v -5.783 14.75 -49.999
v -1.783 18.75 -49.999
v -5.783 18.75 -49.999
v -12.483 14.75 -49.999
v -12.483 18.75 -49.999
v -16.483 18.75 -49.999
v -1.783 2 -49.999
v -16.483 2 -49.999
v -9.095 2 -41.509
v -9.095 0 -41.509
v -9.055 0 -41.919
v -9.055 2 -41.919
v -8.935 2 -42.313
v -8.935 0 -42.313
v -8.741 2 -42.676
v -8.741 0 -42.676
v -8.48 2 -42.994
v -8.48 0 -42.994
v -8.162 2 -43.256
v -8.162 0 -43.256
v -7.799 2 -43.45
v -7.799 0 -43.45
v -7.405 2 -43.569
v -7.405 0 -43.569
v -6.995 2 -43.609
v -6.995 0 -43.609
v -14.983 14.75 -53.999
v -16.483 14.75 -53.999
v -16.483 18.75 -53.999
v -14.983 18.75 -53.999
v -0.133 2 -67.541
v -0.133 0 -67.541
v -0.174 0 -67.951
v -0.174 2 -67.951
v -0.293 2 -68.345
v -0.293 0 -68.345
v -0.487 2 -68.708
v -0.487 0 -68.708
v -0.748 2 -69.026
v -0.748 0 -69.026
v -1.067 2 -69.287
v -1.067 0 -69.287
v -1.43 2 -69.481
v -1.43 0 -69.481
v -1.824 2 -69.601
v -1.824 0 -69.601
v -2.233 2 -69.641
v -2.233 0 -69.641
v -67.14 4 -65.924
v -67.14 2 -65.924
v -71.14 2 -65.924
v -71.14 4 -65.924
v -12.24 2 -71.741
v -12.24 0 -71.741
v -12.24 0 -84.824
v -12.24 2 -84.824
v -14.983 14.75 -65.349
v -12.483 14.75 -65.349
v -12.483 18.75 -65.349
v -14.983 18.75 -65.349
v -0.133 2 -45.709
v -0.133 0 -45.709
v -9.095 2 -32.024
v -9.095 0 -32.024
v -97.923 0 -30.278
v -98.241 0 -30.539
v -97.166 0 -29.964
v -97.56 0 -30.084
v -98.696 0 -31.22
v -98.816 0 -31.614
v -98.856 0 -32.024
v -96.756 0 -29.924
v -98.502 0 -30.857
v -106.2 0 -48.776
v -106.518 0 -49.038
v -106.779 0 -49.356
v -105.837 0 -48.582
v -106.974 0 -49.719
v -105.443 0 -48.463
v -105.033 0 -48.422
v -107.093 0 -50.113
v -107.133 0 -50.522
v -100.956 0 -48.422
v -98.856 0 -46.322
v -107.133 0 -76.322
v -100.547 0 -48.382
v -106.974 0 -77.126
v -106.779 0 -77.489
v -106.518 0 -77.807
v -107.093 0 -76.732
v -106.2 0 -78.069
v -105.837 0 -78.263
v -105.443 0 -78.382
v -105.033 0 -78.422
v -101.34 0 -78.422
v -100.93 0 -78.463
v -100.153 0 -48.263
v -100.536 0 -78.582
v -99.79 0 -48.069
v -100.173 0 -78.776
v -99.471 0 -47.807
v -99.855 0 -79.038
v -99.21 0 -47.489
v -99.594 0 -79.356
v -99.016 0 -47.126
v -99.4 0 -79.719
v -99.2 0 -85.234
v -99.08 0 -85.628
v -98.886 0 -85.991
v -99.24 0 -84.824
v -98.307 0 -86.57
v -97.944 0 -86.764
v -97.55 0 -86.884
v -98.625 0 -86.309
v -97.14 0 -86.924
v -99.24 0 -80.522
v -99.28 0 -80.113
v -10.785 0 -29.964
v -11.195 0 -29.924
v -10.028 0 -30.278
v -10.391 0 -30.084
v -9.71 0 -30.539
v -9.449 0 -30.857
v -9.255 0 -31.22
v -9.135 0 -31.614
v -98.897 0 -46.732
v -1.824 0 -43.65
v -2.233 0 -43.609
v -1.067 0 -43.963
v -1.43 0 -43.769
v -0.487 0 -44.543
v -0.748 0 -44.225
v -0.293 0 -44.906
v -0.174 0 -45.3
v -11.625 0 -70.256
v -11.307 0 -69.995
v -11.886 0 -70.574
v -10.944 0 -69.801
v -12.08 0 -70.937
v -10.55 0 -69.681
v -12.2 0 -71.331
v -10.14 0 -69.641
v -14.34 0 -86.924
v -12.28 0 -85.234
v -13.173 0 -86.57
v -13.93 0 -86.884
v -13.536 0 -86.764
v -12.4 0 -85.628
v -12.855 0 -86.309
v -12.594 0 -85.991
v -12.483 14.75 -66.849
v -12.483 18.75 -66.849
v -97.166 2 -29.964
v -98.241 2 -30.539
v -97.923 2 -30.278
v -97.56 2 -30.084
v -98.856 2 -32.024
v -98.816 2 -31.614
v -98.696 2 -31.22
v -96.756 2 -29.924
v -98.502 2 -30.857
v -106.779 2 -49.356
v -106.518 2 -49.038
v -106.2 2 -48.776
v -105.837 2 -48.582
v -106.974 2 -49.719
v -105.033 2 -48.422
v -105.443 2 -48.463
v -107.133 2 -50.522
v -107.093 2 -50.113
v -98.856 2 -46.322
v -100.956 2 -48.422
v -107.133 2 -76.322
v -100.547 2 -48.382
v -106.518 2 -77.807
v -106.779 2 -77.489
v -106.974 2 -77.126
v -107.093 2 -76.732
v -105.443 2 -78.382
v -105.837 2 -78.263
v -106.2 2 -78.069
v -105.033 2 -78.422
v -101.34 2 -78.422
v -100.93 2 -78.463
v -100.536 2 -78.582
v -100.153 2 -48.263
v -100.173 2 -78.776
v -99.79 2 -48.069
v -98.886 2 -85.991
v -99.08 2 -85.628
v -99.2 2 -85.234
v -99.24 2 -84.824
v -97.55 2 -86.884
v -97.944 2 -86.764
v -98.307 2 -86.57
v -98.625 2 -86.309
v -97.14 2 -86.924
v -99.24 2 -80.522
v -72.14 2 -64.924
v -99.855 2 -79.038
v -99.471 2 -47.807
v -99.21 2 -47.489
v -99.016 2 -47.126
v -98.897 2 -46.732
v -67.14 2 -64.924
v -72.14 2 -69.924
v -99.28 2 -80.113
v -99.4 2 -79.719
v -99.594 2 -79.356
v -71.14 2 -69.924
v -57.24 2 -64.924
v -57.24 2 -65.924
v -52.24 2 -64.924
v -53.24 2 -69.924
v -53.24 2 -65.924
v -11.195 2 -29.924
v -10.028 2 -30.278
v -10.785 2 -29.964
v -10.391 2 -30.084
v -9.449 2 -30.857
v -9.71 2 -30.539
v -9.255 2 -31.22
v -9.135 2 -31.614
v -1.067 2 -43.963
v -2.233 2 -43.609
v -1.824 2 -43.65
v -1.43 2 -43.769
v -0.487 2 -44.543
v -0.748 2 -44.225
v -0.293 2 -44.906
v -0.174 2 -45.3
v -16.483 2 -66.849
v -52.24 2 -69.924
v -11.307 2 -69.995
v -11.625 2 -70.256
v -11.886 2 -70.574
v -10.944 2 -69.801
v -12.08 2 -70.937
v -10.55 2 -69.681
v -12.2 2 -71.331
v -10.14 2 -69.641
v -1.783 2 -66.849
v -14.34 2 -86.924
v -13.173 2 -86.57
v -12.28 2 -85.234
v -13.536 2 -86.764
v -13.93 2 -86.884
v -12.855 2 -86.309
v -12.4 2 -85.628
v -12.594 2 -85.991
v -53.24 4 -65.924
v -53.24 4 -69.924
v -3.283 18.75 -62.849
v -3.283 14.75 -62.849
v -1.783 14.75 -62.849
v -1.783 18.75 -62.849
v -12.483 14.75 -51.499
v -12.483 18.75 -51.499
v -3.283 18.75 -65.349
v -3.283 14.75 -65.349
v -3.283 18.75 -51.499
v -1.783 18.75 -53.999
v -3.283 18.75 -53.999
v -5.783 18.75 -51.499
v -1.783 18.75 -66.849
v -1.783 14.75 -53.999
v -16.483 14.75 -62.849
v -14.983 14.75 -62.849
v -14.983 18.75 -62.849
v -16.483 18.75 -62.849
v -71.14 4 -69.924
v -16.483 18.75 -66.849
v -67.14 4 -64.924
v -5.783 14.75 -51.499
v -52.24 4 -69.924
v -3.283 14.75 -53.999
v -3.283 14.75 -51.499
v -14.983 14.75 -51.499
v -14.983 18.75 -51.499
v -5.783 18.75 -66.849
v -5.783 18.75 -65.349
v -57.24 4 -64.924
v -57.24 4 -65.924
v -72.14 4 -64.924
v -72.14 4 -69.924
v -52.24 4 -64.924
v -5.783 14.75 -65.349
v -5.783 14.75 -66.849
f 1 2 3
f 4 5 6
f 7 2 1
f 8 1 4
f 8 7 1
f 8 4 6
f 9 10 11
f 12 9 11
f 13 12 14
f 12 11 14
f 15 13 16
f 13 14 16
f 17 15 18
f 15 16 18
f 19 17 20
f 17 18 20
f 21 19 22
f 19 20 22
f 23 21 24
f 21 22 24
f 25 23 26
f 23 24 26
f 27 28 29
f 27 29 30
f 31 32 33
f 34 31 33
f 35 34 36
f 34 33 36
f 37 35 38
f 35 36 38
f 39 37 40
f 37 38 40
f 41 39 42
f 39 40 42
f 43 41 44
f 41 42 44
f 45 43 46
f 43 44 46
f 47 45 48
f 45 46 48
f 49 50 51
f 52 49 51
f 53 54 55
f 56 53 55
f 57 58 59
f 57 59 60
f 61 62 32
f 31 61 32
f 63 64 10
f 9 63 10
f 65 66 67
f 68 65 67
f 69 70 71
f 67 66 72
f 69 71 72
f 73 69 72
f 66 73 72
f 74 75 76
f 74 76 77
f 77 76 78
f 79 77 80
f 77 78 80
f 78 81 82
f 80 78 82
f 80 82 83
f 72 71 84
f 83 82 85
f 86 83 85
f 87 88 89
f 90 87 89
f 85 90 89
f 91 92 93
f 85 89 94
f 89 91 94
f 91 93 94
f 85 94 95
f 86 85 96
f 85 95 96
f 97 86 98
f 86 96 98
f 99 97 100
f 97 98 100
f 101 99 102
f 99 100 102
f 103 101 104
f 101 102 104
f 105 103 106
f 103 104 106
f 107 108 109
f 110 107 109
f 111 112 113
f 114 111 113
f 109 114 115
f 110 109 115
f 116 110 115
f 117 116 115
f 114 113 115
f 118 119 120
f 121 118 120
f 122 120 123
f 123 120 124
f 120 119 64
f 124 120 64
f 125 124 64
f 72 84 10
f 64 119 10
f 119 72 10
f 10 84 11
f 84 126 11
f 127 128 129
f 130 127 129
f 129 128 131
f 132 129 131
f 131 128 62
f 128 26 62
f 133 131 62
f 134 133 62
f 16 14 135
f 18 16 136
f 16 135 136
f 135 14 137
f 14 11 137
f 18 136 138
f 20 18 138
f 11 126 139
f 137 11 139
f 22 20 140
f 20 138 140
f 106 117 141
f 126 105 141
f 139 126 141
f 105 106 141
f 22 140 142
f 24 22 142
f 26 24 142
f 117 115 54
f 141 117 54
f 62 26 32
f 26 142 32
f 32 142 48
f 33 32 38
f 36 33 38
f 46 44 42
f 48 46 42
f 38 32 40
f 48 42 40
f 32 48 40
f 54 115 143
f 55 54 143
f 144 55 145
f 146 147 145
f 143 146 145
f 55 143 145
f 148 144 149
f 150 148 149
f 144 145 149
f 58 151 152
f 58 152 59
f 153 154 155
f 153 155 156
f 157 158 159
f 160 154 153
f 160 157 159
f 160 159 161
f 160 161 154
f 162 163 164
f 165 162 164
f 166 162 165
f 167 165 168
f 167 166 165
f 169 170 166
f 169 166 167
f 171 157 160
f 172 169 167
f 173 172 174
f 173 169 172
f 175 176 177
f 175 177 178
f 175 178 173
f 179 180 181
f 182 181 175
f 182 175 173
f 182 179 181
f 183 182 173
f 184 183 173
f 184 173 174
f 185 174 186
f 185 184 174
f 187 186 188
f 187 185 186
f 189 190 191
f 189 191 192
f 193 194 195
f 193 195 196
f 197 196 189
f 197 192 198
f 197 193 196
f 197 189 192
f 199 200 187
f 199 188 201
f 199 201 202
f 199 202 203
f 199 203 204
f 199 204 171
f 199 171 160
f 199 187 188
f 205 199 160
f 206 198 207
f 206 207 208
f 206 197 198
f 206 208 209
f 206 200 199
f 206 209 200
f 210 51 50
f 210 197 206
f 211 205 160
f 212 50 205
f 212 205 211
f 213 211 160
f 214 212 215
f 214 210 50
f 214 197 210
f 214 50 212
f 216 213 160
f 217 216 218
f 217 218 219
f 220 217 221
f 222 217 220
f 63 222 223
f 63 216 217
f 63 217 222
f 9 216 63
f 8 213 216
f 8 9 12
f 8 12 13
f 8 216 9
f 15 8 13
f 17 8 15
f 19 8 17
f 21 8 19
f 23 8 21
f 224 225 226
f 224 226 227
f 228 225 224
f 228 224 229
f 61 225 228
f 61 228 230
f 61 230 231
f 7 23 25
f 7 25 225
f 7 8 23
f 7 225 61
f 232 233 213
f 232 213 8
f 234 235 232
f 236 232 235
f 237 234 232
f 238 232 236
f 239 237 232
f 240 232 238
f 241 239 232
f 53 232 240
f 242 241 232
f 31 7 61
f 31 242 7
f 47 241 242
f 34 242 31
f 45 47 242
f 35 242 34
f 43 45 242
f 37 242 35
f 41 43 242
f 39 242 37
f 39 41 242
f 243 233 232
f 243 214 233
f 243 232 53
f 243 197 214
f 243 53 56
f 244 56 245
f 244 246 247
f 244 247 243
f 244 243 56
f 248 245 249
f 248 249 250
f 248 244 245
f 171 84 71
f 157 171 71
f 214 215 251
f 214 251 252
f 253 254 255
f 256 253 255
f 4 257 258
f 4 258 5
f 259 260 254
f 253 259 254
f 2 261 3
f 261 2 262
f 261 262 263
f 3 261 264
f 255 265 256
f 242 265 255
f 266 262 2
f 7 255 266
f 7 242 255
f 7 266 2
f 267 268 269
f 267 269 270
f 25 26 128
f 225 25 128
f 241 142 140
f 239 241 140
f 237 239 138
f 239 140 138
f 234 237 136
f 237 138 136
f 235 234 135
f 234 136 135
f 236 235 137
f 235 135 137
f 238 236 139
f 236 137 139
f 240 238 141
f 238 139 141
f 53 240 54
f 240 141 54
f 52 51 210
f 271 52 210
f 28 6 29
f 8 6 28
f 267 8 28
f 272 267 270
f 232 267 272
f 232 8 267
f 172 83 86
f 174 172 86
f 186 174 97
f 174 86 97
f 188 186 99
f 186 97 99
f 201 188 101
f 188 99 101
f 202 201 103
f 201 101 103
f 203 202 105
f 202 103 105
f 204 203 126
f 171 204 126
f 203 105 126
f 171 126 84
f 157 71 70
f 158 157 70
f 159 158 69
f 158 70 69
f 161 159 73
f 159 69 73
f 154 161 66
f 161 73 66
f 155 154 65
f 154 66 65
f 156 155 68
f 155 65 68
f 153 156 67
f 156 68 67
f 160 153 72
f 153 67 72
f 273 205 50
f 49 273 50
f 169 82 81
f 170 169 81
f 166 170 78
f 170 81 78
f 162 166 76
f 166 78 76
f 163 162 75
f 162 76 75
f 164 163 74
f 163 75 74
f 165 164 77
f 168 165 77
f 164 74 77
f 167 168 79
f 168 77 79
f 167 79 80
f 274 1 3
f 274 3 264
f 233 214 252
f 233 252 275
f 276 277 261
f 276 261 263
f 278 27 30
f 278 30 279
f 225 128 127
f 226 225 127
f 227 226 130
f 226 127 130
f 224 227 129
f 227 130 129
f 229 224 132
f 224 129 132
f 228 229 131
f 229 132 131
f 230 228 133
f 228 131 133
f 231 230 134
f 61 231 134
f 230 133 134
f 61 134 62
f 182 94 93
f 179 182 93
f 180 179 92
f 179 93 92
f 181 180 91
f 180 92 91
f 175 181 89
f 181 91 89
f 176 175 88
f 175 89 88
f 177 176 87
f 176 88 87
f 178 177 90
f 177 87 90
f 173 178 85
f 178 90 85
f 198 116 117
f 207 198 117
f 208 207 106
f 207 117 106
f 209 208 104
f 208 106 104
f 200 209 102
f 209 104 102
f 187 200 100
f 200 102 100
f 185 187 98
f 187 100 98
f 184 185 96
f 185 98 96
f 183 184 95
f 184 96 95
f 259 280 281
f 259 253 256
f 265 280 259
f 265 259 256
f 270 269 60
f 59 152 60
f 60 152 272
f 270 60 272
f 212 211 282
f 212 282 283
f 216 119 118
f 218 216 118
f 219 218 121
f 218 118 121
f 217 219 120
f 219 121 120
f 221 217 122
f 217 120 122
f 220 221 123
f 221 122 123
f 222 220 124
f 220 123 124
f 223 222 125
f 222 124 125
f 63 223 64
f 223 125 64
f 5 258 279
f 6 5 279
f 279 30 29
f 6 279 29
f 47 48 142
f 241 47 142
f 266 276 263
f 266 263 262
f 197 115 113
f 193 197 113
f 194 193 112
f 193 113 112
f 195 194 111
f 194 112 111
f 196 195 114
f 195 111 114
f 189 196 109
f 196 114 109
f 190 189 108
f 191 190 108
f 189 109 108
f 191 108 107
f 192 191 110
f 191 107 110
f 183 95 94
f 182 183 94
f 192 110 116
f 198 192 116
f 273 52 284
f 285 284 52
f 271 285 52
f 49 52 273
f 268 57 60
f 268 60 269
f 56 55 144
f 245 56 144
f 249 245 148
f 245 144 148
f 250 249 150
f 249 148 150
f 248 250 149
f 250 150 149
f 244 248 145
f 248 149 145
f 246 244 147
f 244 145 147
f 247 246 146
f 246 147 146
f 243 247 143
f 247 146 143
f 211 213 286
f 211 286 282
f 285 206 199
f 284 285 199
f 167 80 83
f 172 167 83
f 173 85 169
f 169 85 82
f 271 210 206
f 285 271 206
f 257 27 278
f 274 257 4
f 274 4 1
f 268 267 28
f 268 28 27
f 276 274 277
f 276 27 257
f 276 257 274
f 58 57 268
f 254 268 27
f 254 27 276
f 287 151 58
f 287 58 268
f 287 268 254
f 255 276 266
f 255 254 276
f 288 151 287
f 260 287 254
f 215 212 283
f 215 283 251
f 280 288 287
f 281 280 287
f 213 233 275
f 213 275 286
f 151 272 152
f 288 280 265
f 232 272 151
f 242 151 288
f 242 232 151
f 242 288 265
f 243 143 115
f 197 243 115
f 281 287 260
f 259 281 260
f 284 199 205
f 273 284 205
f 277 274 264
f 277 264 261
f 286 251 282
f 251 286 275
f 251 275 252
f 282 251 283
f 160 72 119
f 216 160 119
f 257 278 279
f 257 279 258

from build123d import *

# Parameters (mm, degrees)
BOSS_EXTRUDE1_DEPTH = 2
BOSS_EXTRUDE2_DEPTH = 2
SKETCH3_W           = 14.7
SKETCH3_H           = 16.85
BOSS_EXTRUDE3_DEPTH = 12.75
BOSS_EXTRUDE4_DEPTH = 4


with BuildPart() as part:
    # Sketch1 → Boss-Extrude1 (new body)
    with BuildSketch(Plane(origin=(0, 0, 0), x_dir=(1, 0, 0), z_dir=(0, 1, 0))):
        with BuildLine():
            Line((-14.340002267, 86.923975611), (-97.140002267, 86.923975611))
            ThreePointArc((-97.140002267, 86.923975611), (-98.624926507, 86.308899852), (-99.240002267, 84.823975611))
            Line((-99.240002267, 84.823975611), (-99.240002267, 80.522464507))
            ThreePointArc((-99.240002267, 80.522464507), (-99.855078026, 79.037540266), (-101.340002267, 78.422464507))
            Line((-101.340002267, 78.422464507), (-105.03337779, 78.422464507))
            ThreePointArc((-105.03337779, 78.422464507), (-106.51830203, 77.807388747), (-107.13337779, 76.322464507))
            Line((-107.13337779, 76.322464507), (-107.13337779, 50.522464507))
            ThreePointArc((-107.13337779, 50.522464507), (-106.51830203, 49.037540266), (-105.03337779, 48.422464507))
            Line((-105.03337779, 48.422464507), (-100.956274126, 48.422464507))
            ThreePointArc((-100.956274126, 48.422464507), (-99.471349885, 47.807388747), (-98.856274126, 46.322464507))
            Line((-98.856274126, 46.322464507), (-98.856274126, 32.023975611))
            ThreePointArc((-98.856274126, 32.023975611), (-98.241198366, 30.539051371), (-96.756274126, 29.923975611))
            Line((-96.756274126, 29.923975611), (-11.195092997, 29.923975611))
            ThreePointArc((-11.195092997, 29.923975611), (-9.710168757, 30.539051371), (-9.095092997, 32.023975611))
            Line((-9.095092997, 32.023975611), (-9.095092997, 41.509498791))
            ThreePointArc((-9.095092997, 41.509498791), (-8.480017238, 42.994423032), (-6.995092997, 43.609498791))
            Line((-6.995092997, 43.609498791), (-2.23337779, 43.609498791))
            ThreePointArc((-2.23337779, 43.609498791), (-0.748453549, 44.224574551), (-0.13337779, 45.709498791))
            Line((-0.13337779, 45.709498791), (-0.13337779, 67.540883484))
            ThreePointArc((-0.13337779, 67.540883484), (-0.748453549, 69.025807724), (-2.23337779, 69.640883484))
            Line((-2.23337779, 69.640883484), (-10.140002267, 69.640883484))
            ThreePointArc((-10.140002267, 69.640883484), (-11.624926507, 70.255959243), (-12.240002267, 71.740883484))
            Line((-12.240002267, 71.740883484), (-12.240002267, 84.823975611))
            ThreePointArc((-12.240002267, 84.823975611), (-12.855078026, 86.308899852), (-14.340002267, 86.923975611))
        make_face()
    extrude(amount=BOSS_EXTRUDE1_DEPTH)

    # Sketch2 → Boss-Extrude2 (add)
    with BuildSketch(Plane(origin=(0, 2, 0), x_dir=(1, 0, 0), z_dir=(0, 1, 0))):
        Polygon((-52.240002267, 64.923975611), (-57.240002267, 64.923975611), (-57.240002267, 65.923975611), (-53.240002267, 65.923975611), (-53.240002267, 69.923975611), (-52.240002267, 69.923975611), align=None)
        Polygon((-72.140002267, 64.923975611), (-67.140002267, 64.923975611), (-67.140002267, 65.923975611), (-71.140002267, 65.923975611), (-71.140002267, 69.923975611), (-72.140002267, 69.923975611), align=None)
    extrude(amount=BOSS_EXTRUDE2_DEPTH)

    # Sketch3 → Boss-Extrude3 (add)
    with BuildSketch(Plane(origin=(0, 2, 0), x_dir=(1, 0, 0), z_dir=(0, 1, 0))):
        with Locations((-9.13337779, 58.423975611)):
            Rectangle(SKETCH3_W, SKETCH3_H)
    extrude(amount=BOSS_EXTRUDE3_DEPTH)

    # Sketch4 → Boss-Extrude4 (add)
    with BuildSketch(Plane(origin=(0, 14.75, 0), x_dir=(1, 0, 0), z_dir=(0, 1, 0))):
        Polygon((-1.78337779, 49.998975611), (-5.78337779, 49.998975611), (-5.78337779, 51.498975611), (-3.28337779, 51.498975611), (-3.28337779, 53.998975611), (-1.78337779, 53.998975611), align=None)
        Polygon((-1.78337779, 66.848975611), (-5.78337779, 66.848975611), (-5.78337779, 65.348975611), (-3.28337779, 65.348975611), (-3.28337779, 62.848975611), (-1.78337779, 62.848975611), align=None)
        Polygon((-16.48337779, 49.998975611), (-16.48337779, 53.998975611), (-14.98337779, 53.998975611), (-14.98337779, 51.498975611), (-12.48337779, 51.498975611), (-12.48337779, 49.998975611), align=None)
        Polygon((-14.98337779, 62.848975611), (-16.48337779, 62.848975611), (-16.48337779, 66.848975611), (-12.48337779, 66.848975611), (-12.48337779, 65.348975611), (-14.98337779, 65.348975611), align=None)
    extrude(amount=BOSS_EXTRUDE4_DEPTH)


solid = part.part
